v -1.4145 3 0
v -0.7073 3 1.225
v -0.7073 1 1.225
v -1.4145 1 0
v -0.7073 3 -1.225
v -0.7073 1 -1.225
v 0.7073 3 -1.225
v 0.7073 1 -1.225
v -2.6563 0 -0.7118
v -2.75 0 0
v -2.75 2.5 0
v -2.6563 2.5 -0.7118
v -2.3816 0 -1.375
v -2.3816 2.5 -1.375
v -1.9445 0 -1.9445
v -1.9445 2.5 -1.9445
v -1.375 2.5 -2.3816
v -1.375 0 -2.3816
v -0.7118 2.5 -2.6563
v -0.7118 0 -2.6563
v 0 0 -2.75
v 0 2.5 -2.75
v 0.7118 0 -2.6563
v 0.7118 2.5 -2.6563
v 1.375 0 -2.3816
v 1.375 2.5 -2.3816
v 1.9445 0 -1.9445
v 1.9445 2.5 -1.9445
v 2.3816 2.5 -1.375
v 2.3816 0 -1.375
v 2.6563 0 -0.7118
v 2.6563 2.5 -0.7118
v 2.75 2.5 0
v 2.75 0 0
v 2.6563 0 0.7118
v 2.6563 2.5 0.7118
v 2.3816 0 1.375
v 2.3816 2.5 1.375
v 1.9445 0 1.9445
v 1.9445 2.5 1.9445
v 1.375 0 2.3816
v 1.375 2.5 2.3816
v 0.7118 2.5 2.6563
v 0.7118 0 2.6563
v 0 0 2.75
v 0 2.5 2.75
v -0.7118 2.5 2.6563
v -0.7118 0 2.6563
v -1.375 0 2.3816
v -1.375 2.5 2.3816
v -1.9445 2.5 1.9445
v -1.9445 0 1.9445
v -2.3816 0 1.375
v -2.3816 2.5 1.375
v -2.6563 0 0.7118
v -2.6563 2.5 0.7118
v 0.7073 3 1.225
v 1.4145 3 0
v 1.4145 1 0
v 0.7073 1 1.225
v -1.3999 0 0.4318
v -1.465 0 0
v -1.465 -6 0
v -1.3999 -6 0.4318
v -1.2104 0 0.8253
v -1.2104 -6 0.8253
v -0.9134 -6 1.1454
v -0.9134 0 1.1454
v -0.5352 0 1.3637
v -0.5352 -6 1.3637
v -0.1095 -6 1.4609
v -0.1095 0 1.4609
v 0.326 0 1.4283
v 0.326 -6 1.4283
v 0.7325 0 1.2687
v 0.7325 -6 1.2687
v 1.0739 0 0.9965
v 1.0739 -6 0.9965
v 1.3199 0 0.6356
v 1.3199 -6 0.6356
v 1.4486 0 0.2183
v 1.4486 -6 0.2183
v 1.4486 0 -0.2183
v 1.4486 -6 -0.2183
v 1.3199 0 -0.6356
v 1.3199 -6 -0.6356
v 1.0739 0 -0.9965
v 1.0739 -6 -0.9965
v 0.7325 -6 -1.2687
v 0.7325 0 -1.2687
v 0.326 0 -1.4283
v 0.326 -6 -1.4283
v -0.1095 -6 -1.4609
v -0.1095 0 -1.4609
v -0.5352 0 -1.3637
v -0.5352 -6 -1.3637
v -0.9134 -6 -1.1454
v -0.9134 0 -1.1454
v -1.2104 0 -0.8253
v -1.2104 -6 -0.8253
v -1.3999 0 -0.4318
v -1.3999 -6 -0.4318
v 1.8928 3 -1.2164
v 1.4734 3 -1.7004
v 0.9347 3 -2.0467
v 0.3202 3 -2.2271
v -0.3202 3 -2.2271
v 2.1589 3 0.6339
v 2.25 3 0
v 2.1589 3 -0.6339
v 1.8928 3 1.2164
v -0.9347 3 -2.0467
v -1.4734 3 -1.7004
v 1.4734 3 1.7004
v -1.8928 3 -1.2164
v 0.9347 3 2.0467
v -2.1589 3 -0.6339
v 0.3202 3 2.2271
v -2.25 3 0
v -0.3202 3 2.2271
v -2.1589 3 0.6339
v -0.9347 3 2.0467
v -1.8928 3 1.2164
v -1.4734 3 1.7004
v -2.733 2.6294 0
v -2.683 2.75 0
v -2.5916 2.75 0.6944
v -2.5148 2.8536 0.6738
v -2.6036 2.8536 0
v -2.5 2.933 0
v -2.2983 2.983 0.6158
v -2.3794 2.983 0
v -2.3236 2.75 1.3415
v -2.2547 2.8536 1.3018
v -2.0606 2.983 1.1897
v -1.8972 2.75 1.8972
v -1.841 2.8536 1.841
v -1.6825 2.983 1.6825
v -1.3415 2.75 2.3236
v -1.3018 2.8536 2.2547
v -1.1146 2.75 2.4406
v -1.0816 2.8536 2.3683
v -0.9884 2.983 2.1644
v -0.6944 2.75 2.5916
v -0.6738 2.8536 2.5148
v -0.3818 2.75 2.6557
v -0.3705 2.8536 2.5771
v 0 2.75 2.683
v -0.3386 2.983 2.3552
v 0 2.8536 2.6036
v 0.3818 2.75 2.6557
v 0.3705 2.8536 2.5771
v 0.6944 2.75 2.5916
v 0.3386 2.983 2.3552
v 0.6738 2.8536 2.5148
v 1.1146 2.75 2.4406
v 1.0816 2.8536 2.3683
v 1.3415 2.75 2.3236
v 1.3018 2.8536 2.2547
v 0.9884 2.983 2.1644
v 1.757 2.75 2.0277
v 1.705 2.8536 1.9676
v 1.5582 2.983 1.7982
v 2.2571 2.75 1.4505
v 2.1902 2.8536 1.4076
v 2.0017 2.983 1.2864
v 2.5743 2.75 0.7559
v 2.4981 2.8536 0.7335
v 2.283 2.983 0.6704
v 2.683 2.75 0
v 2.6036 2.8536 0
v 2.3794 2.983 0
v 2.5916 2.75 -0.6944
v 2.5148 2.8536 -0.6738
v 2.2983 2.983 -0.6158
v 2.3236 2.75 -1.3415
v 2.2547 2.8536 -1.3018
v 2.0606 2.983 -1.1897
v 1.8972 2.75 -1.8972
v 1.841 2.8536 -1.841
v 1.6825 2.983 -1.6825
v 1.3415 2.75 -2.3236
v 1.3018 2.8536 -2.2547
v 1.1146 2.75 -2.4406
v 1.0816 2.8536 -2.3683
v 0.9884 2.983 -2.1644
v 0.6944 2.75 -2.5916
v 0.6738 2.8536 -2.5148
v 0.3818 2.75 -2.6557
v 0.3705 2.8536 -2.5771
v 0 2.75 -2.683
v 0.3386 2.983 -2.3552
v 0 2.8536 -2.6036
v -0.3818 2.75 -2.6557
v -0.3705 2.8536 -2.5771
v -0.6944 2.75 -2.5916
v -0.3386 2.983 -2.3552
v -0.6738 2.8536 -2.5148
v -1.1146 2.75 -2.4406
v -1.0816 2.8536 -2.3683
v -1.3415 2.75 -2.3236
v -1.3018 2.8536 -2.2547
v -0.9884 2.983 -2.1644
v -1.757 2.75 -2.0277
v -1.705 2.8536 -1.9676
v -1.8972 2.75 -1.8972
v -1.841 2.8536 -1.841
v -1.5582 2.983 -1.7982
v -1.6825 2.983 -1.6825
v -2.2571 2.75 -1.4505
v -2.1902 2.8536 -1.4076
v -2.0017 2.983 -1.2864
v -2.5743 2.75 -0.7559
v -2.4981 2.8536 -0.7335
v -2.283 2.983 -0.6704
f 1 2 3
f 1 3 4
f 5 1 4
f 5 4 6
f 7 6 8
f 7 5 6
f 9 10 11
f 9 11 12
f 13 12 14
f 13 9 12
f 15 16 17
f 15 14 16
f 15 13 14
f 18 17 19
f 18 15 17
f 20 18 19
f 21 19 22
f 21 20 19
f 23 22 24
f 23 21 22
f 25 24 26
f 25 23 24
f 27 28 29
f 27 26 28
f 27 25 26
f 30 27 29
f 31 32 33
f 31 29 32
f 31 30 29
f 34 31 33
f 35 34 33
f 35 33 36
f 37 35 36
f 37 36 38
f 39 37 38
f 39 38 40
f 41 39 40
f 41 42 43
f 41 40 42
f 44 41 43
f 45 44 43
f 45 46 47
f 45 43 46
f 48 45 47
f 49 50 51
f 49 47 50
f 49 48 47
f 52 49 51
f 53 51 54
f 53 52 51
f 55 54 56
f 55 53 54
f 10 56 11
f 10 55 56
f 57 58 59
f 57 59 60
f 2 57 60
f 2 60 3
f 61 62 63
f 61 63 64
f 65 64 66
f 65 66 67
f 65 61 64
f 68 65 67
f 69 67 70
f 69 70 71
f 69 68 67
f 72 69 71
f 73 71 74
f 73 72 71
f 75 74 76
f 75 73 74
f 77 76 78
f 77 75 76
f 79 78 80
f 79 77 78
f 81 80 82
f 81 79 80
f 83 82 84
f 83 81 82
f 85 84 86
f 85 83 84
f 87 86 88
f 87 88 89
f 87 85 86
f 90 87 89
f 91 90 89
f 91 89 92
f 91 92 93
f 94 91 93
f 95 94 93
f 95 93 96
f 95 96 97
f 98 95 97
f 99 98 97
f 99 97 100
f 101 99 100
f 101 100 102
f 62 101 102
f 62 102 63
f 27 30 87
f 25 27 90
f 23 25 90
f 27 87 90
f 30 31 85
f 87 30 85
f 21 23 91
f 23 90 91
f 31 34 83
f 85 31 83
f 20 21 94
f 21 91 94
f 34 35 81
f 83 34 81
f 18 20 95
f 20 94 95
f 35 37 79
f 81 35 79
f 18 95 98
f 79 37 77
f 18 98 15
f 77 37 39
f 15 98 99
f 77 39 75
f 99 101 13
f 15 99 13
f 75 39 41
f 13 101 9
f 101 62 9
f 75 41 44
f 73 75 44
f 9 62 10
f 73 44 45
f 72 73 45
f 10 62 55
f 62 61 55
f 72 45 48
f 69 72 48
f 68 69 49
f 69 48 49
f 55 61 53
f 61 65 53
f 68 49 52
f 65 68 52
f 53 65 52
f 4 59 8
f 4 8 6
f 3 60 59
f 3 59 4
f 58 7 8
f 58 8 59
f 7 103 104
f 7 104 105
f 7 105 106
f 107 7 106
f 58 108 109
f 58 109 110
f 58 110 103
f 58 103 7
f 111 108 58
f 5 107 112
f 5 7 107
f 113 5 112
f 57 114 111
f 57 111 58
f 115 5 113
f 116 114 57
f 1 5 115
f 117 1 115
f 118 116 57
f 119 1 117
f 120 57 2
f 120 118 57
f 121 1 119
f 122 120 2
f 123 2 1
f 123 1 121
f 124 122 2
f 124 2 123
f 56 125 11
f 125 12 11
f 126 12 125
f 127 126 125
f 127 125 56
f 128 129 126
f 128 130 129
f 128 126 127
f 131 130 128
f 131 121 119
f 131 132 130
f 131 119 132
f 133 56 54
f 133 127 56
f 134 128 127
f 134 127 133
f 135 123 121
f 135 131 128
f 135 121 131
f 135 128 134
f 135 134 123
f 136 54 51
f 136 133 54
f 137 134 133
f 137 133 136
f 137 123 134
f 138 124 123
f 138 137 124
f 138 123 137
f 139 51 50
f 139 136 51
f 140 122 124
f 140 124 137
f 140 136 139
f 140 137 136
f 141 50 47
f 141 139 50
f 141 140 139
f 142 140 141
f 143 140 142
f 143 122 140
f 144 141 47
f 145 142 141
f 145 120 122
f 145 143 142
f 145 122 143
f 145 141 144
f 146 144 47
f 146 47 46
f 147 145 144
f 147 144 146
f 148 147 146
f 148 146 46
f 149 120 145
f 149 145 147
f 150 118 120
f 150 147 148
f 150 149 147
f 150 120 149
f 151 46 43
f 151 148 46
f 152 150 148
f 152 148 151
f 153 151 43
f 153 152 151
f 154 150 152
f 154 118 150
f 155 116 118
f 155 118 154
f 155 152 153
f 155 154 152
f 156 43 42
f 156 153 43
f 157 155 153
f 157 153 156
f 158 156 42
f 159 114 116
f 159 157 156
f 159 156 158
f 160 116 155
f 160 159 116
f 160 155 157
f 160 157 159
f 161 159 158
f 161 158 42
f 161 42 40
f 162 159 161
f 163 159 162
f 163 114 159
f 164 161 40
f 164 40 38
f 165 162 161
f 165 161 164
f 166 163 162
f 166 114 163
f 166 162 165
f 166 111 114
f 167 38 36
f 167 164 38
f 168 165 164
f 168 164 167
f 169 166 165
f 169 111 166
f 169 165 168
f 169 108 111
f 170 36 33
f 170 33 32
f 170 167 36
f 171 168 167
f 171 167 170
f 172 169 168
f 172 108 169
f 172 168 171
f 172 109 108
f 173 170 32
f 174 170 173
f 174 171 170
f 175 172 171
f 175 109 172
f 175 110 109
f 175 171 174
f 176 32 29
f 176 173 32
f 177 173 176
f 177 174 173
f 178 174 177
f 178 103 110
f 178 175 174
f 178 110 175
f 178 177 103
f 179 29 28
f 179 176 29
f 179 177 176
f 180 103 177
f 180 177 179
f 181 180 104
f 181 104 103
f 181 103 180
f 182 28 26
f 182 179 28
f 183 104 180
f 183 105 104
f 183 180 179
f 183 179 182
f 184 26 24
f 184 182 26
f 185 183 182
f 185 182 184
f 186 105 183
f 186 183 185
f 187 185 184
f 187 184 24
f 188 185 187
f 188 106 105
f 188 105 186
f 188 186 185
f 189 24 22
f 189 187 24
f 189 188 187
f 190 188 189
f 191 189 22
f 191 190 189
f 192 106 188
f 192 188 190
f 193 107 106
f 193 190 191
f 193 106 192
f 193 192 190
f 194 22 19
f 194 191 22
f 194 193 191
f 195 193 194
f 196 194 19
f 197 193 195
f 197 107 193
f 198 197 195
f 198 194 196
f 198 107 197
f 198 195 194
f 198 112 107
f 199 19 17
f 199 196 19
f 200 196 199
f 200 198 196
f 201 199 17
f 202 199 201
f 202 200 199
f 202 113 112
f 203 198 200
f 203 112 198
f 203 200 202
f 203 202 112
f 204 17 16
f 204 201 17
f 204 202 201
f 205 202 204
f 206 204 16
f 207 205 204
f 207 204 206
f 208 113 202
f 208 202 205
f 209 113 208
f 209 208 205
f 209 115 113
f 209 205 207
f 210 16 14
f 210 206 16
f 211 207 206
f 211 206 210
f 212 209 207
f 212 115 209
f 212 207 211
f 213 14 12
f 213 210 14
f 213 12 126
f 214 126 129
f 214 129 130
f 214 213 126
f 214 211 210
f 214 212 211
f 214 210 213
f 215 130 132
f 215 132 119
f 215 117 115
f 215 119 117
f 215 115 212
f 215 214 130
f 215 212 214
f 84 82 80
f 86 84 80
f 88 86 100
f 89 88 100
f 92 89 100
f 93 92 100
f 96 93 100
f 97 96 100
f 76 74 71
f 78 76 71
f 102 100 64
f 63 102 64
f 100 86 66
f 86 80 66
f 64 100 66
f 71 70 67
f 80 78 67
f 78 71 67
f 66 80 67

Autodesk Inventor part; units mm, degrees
ref_plane "YZ Plane" through (0, 0, 0) normal (1, 0, 0) x (0, 1, 0)
ref_plane "XZ Plane" through (0, 0, 0) normal (0, 1, 0) x (-1, 0, 0)
ref_plane "XY Plane" through (0, 0, 0) normal (0, 0, 1) x (1, 0, 0)
sketch "Sketch1" plane through (0, 0, 0) normal (0, 1, 0) x (-1, 0, 0)
  circle A0 centre (0, 0) radius 1.465
  circle A1 centre (0, 0) radius 2.75
  line L0 (0.7073, -1.225) -> (-0.7073, -1.225)
  line L1 (-0.7073, -1.225) -> (-1.4145, 0)
  line L2 (-1.4145, 0) -> (-0.7073, 1.225)
  line L3 (-0.7073, 1.225) -> (0.7073, 1.225)
  line L4 (0.7073, 1.225) -> (1.4145, 0)
  line L5 (1.4145, 0) -> (0.7073, -1.225)
  dimension "d0" = 2.93
  dimension "d1" = 5.5
  dimension "d8" = 2.45
extrude "Extrusion1" add sketch "Sketch1" along normal blind 3 contours A0 | A1 | L0 L1 L2 L3 L4 L5
extrude "Extrusion2" add sketch "Sketch1" against normal blind 6 contours A0 | L0 L1 L2 L3 L4 L5
extrude "Extrusion3" cut sketch "Sketch1" against normal blind 2 from surface at 3 contours L0 L1 L2 L3 L4 L5
fillet "Fillet1" radius 0.5 1 edges at (2.75, 3, 0)
thread "Thread2" size "M3x0.5" class "6g" standard "ANSI Metric M Profile" full length
equation "\"d4\" = length"
equation "\"length\" = 6"
properties part number "M3x16"
